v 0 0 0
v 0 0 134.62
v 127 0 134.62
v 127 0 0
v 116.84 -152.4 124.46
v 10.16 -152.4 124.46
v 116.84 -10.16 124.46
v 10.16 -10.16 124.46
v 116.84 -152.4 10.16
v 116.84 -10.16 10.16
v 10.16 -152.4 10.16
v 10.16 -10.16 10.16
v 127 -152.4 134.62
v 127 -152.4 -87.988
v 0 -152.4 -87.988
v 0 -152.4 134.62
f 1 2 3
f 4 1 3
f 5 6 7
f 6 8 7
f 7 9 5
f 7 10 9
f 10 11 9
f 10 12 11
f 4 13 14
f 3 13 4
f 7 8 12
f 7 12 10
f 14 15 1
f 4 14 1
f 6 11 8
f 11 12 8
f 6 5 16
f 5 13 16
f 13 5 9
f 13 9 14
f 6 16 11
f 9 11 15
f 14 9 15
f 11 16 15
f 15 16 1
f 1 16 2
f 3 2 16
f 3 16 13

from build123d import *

# Parameters (mm, degrees)
F0_W     = 127
F0_H     = 134.62
F1_DEPTH = 152.4
F2_T     = -10.16
F4_DEPTH = 127


with BuildPart() as f1:
    # F0 (on Front) → F1 (new body)
    with BuildSketch(Plane.XZ):
        with Locations((63.5, 67.31)):
            Rectangle(F0_W, F0_H)
    extrude(amount=F1_DEPTH)

    # F2
    f2_openings = [f1.faces().sort_by_distance(p)[0] for p in [
        (63.5, -152.4, 67.31),
    ]]
    offset(amount=F2_T, openings=f2_openings)

    # F3 (on Right) → F4 (join, through all)
    with BuildSketch(Plane.YZ):
        Polygon((-152.4, -87.988181), (0, 0), (-152.4, 0), align=None)
    extrude(amount=F4_DEPTH)


solid = f1.part
